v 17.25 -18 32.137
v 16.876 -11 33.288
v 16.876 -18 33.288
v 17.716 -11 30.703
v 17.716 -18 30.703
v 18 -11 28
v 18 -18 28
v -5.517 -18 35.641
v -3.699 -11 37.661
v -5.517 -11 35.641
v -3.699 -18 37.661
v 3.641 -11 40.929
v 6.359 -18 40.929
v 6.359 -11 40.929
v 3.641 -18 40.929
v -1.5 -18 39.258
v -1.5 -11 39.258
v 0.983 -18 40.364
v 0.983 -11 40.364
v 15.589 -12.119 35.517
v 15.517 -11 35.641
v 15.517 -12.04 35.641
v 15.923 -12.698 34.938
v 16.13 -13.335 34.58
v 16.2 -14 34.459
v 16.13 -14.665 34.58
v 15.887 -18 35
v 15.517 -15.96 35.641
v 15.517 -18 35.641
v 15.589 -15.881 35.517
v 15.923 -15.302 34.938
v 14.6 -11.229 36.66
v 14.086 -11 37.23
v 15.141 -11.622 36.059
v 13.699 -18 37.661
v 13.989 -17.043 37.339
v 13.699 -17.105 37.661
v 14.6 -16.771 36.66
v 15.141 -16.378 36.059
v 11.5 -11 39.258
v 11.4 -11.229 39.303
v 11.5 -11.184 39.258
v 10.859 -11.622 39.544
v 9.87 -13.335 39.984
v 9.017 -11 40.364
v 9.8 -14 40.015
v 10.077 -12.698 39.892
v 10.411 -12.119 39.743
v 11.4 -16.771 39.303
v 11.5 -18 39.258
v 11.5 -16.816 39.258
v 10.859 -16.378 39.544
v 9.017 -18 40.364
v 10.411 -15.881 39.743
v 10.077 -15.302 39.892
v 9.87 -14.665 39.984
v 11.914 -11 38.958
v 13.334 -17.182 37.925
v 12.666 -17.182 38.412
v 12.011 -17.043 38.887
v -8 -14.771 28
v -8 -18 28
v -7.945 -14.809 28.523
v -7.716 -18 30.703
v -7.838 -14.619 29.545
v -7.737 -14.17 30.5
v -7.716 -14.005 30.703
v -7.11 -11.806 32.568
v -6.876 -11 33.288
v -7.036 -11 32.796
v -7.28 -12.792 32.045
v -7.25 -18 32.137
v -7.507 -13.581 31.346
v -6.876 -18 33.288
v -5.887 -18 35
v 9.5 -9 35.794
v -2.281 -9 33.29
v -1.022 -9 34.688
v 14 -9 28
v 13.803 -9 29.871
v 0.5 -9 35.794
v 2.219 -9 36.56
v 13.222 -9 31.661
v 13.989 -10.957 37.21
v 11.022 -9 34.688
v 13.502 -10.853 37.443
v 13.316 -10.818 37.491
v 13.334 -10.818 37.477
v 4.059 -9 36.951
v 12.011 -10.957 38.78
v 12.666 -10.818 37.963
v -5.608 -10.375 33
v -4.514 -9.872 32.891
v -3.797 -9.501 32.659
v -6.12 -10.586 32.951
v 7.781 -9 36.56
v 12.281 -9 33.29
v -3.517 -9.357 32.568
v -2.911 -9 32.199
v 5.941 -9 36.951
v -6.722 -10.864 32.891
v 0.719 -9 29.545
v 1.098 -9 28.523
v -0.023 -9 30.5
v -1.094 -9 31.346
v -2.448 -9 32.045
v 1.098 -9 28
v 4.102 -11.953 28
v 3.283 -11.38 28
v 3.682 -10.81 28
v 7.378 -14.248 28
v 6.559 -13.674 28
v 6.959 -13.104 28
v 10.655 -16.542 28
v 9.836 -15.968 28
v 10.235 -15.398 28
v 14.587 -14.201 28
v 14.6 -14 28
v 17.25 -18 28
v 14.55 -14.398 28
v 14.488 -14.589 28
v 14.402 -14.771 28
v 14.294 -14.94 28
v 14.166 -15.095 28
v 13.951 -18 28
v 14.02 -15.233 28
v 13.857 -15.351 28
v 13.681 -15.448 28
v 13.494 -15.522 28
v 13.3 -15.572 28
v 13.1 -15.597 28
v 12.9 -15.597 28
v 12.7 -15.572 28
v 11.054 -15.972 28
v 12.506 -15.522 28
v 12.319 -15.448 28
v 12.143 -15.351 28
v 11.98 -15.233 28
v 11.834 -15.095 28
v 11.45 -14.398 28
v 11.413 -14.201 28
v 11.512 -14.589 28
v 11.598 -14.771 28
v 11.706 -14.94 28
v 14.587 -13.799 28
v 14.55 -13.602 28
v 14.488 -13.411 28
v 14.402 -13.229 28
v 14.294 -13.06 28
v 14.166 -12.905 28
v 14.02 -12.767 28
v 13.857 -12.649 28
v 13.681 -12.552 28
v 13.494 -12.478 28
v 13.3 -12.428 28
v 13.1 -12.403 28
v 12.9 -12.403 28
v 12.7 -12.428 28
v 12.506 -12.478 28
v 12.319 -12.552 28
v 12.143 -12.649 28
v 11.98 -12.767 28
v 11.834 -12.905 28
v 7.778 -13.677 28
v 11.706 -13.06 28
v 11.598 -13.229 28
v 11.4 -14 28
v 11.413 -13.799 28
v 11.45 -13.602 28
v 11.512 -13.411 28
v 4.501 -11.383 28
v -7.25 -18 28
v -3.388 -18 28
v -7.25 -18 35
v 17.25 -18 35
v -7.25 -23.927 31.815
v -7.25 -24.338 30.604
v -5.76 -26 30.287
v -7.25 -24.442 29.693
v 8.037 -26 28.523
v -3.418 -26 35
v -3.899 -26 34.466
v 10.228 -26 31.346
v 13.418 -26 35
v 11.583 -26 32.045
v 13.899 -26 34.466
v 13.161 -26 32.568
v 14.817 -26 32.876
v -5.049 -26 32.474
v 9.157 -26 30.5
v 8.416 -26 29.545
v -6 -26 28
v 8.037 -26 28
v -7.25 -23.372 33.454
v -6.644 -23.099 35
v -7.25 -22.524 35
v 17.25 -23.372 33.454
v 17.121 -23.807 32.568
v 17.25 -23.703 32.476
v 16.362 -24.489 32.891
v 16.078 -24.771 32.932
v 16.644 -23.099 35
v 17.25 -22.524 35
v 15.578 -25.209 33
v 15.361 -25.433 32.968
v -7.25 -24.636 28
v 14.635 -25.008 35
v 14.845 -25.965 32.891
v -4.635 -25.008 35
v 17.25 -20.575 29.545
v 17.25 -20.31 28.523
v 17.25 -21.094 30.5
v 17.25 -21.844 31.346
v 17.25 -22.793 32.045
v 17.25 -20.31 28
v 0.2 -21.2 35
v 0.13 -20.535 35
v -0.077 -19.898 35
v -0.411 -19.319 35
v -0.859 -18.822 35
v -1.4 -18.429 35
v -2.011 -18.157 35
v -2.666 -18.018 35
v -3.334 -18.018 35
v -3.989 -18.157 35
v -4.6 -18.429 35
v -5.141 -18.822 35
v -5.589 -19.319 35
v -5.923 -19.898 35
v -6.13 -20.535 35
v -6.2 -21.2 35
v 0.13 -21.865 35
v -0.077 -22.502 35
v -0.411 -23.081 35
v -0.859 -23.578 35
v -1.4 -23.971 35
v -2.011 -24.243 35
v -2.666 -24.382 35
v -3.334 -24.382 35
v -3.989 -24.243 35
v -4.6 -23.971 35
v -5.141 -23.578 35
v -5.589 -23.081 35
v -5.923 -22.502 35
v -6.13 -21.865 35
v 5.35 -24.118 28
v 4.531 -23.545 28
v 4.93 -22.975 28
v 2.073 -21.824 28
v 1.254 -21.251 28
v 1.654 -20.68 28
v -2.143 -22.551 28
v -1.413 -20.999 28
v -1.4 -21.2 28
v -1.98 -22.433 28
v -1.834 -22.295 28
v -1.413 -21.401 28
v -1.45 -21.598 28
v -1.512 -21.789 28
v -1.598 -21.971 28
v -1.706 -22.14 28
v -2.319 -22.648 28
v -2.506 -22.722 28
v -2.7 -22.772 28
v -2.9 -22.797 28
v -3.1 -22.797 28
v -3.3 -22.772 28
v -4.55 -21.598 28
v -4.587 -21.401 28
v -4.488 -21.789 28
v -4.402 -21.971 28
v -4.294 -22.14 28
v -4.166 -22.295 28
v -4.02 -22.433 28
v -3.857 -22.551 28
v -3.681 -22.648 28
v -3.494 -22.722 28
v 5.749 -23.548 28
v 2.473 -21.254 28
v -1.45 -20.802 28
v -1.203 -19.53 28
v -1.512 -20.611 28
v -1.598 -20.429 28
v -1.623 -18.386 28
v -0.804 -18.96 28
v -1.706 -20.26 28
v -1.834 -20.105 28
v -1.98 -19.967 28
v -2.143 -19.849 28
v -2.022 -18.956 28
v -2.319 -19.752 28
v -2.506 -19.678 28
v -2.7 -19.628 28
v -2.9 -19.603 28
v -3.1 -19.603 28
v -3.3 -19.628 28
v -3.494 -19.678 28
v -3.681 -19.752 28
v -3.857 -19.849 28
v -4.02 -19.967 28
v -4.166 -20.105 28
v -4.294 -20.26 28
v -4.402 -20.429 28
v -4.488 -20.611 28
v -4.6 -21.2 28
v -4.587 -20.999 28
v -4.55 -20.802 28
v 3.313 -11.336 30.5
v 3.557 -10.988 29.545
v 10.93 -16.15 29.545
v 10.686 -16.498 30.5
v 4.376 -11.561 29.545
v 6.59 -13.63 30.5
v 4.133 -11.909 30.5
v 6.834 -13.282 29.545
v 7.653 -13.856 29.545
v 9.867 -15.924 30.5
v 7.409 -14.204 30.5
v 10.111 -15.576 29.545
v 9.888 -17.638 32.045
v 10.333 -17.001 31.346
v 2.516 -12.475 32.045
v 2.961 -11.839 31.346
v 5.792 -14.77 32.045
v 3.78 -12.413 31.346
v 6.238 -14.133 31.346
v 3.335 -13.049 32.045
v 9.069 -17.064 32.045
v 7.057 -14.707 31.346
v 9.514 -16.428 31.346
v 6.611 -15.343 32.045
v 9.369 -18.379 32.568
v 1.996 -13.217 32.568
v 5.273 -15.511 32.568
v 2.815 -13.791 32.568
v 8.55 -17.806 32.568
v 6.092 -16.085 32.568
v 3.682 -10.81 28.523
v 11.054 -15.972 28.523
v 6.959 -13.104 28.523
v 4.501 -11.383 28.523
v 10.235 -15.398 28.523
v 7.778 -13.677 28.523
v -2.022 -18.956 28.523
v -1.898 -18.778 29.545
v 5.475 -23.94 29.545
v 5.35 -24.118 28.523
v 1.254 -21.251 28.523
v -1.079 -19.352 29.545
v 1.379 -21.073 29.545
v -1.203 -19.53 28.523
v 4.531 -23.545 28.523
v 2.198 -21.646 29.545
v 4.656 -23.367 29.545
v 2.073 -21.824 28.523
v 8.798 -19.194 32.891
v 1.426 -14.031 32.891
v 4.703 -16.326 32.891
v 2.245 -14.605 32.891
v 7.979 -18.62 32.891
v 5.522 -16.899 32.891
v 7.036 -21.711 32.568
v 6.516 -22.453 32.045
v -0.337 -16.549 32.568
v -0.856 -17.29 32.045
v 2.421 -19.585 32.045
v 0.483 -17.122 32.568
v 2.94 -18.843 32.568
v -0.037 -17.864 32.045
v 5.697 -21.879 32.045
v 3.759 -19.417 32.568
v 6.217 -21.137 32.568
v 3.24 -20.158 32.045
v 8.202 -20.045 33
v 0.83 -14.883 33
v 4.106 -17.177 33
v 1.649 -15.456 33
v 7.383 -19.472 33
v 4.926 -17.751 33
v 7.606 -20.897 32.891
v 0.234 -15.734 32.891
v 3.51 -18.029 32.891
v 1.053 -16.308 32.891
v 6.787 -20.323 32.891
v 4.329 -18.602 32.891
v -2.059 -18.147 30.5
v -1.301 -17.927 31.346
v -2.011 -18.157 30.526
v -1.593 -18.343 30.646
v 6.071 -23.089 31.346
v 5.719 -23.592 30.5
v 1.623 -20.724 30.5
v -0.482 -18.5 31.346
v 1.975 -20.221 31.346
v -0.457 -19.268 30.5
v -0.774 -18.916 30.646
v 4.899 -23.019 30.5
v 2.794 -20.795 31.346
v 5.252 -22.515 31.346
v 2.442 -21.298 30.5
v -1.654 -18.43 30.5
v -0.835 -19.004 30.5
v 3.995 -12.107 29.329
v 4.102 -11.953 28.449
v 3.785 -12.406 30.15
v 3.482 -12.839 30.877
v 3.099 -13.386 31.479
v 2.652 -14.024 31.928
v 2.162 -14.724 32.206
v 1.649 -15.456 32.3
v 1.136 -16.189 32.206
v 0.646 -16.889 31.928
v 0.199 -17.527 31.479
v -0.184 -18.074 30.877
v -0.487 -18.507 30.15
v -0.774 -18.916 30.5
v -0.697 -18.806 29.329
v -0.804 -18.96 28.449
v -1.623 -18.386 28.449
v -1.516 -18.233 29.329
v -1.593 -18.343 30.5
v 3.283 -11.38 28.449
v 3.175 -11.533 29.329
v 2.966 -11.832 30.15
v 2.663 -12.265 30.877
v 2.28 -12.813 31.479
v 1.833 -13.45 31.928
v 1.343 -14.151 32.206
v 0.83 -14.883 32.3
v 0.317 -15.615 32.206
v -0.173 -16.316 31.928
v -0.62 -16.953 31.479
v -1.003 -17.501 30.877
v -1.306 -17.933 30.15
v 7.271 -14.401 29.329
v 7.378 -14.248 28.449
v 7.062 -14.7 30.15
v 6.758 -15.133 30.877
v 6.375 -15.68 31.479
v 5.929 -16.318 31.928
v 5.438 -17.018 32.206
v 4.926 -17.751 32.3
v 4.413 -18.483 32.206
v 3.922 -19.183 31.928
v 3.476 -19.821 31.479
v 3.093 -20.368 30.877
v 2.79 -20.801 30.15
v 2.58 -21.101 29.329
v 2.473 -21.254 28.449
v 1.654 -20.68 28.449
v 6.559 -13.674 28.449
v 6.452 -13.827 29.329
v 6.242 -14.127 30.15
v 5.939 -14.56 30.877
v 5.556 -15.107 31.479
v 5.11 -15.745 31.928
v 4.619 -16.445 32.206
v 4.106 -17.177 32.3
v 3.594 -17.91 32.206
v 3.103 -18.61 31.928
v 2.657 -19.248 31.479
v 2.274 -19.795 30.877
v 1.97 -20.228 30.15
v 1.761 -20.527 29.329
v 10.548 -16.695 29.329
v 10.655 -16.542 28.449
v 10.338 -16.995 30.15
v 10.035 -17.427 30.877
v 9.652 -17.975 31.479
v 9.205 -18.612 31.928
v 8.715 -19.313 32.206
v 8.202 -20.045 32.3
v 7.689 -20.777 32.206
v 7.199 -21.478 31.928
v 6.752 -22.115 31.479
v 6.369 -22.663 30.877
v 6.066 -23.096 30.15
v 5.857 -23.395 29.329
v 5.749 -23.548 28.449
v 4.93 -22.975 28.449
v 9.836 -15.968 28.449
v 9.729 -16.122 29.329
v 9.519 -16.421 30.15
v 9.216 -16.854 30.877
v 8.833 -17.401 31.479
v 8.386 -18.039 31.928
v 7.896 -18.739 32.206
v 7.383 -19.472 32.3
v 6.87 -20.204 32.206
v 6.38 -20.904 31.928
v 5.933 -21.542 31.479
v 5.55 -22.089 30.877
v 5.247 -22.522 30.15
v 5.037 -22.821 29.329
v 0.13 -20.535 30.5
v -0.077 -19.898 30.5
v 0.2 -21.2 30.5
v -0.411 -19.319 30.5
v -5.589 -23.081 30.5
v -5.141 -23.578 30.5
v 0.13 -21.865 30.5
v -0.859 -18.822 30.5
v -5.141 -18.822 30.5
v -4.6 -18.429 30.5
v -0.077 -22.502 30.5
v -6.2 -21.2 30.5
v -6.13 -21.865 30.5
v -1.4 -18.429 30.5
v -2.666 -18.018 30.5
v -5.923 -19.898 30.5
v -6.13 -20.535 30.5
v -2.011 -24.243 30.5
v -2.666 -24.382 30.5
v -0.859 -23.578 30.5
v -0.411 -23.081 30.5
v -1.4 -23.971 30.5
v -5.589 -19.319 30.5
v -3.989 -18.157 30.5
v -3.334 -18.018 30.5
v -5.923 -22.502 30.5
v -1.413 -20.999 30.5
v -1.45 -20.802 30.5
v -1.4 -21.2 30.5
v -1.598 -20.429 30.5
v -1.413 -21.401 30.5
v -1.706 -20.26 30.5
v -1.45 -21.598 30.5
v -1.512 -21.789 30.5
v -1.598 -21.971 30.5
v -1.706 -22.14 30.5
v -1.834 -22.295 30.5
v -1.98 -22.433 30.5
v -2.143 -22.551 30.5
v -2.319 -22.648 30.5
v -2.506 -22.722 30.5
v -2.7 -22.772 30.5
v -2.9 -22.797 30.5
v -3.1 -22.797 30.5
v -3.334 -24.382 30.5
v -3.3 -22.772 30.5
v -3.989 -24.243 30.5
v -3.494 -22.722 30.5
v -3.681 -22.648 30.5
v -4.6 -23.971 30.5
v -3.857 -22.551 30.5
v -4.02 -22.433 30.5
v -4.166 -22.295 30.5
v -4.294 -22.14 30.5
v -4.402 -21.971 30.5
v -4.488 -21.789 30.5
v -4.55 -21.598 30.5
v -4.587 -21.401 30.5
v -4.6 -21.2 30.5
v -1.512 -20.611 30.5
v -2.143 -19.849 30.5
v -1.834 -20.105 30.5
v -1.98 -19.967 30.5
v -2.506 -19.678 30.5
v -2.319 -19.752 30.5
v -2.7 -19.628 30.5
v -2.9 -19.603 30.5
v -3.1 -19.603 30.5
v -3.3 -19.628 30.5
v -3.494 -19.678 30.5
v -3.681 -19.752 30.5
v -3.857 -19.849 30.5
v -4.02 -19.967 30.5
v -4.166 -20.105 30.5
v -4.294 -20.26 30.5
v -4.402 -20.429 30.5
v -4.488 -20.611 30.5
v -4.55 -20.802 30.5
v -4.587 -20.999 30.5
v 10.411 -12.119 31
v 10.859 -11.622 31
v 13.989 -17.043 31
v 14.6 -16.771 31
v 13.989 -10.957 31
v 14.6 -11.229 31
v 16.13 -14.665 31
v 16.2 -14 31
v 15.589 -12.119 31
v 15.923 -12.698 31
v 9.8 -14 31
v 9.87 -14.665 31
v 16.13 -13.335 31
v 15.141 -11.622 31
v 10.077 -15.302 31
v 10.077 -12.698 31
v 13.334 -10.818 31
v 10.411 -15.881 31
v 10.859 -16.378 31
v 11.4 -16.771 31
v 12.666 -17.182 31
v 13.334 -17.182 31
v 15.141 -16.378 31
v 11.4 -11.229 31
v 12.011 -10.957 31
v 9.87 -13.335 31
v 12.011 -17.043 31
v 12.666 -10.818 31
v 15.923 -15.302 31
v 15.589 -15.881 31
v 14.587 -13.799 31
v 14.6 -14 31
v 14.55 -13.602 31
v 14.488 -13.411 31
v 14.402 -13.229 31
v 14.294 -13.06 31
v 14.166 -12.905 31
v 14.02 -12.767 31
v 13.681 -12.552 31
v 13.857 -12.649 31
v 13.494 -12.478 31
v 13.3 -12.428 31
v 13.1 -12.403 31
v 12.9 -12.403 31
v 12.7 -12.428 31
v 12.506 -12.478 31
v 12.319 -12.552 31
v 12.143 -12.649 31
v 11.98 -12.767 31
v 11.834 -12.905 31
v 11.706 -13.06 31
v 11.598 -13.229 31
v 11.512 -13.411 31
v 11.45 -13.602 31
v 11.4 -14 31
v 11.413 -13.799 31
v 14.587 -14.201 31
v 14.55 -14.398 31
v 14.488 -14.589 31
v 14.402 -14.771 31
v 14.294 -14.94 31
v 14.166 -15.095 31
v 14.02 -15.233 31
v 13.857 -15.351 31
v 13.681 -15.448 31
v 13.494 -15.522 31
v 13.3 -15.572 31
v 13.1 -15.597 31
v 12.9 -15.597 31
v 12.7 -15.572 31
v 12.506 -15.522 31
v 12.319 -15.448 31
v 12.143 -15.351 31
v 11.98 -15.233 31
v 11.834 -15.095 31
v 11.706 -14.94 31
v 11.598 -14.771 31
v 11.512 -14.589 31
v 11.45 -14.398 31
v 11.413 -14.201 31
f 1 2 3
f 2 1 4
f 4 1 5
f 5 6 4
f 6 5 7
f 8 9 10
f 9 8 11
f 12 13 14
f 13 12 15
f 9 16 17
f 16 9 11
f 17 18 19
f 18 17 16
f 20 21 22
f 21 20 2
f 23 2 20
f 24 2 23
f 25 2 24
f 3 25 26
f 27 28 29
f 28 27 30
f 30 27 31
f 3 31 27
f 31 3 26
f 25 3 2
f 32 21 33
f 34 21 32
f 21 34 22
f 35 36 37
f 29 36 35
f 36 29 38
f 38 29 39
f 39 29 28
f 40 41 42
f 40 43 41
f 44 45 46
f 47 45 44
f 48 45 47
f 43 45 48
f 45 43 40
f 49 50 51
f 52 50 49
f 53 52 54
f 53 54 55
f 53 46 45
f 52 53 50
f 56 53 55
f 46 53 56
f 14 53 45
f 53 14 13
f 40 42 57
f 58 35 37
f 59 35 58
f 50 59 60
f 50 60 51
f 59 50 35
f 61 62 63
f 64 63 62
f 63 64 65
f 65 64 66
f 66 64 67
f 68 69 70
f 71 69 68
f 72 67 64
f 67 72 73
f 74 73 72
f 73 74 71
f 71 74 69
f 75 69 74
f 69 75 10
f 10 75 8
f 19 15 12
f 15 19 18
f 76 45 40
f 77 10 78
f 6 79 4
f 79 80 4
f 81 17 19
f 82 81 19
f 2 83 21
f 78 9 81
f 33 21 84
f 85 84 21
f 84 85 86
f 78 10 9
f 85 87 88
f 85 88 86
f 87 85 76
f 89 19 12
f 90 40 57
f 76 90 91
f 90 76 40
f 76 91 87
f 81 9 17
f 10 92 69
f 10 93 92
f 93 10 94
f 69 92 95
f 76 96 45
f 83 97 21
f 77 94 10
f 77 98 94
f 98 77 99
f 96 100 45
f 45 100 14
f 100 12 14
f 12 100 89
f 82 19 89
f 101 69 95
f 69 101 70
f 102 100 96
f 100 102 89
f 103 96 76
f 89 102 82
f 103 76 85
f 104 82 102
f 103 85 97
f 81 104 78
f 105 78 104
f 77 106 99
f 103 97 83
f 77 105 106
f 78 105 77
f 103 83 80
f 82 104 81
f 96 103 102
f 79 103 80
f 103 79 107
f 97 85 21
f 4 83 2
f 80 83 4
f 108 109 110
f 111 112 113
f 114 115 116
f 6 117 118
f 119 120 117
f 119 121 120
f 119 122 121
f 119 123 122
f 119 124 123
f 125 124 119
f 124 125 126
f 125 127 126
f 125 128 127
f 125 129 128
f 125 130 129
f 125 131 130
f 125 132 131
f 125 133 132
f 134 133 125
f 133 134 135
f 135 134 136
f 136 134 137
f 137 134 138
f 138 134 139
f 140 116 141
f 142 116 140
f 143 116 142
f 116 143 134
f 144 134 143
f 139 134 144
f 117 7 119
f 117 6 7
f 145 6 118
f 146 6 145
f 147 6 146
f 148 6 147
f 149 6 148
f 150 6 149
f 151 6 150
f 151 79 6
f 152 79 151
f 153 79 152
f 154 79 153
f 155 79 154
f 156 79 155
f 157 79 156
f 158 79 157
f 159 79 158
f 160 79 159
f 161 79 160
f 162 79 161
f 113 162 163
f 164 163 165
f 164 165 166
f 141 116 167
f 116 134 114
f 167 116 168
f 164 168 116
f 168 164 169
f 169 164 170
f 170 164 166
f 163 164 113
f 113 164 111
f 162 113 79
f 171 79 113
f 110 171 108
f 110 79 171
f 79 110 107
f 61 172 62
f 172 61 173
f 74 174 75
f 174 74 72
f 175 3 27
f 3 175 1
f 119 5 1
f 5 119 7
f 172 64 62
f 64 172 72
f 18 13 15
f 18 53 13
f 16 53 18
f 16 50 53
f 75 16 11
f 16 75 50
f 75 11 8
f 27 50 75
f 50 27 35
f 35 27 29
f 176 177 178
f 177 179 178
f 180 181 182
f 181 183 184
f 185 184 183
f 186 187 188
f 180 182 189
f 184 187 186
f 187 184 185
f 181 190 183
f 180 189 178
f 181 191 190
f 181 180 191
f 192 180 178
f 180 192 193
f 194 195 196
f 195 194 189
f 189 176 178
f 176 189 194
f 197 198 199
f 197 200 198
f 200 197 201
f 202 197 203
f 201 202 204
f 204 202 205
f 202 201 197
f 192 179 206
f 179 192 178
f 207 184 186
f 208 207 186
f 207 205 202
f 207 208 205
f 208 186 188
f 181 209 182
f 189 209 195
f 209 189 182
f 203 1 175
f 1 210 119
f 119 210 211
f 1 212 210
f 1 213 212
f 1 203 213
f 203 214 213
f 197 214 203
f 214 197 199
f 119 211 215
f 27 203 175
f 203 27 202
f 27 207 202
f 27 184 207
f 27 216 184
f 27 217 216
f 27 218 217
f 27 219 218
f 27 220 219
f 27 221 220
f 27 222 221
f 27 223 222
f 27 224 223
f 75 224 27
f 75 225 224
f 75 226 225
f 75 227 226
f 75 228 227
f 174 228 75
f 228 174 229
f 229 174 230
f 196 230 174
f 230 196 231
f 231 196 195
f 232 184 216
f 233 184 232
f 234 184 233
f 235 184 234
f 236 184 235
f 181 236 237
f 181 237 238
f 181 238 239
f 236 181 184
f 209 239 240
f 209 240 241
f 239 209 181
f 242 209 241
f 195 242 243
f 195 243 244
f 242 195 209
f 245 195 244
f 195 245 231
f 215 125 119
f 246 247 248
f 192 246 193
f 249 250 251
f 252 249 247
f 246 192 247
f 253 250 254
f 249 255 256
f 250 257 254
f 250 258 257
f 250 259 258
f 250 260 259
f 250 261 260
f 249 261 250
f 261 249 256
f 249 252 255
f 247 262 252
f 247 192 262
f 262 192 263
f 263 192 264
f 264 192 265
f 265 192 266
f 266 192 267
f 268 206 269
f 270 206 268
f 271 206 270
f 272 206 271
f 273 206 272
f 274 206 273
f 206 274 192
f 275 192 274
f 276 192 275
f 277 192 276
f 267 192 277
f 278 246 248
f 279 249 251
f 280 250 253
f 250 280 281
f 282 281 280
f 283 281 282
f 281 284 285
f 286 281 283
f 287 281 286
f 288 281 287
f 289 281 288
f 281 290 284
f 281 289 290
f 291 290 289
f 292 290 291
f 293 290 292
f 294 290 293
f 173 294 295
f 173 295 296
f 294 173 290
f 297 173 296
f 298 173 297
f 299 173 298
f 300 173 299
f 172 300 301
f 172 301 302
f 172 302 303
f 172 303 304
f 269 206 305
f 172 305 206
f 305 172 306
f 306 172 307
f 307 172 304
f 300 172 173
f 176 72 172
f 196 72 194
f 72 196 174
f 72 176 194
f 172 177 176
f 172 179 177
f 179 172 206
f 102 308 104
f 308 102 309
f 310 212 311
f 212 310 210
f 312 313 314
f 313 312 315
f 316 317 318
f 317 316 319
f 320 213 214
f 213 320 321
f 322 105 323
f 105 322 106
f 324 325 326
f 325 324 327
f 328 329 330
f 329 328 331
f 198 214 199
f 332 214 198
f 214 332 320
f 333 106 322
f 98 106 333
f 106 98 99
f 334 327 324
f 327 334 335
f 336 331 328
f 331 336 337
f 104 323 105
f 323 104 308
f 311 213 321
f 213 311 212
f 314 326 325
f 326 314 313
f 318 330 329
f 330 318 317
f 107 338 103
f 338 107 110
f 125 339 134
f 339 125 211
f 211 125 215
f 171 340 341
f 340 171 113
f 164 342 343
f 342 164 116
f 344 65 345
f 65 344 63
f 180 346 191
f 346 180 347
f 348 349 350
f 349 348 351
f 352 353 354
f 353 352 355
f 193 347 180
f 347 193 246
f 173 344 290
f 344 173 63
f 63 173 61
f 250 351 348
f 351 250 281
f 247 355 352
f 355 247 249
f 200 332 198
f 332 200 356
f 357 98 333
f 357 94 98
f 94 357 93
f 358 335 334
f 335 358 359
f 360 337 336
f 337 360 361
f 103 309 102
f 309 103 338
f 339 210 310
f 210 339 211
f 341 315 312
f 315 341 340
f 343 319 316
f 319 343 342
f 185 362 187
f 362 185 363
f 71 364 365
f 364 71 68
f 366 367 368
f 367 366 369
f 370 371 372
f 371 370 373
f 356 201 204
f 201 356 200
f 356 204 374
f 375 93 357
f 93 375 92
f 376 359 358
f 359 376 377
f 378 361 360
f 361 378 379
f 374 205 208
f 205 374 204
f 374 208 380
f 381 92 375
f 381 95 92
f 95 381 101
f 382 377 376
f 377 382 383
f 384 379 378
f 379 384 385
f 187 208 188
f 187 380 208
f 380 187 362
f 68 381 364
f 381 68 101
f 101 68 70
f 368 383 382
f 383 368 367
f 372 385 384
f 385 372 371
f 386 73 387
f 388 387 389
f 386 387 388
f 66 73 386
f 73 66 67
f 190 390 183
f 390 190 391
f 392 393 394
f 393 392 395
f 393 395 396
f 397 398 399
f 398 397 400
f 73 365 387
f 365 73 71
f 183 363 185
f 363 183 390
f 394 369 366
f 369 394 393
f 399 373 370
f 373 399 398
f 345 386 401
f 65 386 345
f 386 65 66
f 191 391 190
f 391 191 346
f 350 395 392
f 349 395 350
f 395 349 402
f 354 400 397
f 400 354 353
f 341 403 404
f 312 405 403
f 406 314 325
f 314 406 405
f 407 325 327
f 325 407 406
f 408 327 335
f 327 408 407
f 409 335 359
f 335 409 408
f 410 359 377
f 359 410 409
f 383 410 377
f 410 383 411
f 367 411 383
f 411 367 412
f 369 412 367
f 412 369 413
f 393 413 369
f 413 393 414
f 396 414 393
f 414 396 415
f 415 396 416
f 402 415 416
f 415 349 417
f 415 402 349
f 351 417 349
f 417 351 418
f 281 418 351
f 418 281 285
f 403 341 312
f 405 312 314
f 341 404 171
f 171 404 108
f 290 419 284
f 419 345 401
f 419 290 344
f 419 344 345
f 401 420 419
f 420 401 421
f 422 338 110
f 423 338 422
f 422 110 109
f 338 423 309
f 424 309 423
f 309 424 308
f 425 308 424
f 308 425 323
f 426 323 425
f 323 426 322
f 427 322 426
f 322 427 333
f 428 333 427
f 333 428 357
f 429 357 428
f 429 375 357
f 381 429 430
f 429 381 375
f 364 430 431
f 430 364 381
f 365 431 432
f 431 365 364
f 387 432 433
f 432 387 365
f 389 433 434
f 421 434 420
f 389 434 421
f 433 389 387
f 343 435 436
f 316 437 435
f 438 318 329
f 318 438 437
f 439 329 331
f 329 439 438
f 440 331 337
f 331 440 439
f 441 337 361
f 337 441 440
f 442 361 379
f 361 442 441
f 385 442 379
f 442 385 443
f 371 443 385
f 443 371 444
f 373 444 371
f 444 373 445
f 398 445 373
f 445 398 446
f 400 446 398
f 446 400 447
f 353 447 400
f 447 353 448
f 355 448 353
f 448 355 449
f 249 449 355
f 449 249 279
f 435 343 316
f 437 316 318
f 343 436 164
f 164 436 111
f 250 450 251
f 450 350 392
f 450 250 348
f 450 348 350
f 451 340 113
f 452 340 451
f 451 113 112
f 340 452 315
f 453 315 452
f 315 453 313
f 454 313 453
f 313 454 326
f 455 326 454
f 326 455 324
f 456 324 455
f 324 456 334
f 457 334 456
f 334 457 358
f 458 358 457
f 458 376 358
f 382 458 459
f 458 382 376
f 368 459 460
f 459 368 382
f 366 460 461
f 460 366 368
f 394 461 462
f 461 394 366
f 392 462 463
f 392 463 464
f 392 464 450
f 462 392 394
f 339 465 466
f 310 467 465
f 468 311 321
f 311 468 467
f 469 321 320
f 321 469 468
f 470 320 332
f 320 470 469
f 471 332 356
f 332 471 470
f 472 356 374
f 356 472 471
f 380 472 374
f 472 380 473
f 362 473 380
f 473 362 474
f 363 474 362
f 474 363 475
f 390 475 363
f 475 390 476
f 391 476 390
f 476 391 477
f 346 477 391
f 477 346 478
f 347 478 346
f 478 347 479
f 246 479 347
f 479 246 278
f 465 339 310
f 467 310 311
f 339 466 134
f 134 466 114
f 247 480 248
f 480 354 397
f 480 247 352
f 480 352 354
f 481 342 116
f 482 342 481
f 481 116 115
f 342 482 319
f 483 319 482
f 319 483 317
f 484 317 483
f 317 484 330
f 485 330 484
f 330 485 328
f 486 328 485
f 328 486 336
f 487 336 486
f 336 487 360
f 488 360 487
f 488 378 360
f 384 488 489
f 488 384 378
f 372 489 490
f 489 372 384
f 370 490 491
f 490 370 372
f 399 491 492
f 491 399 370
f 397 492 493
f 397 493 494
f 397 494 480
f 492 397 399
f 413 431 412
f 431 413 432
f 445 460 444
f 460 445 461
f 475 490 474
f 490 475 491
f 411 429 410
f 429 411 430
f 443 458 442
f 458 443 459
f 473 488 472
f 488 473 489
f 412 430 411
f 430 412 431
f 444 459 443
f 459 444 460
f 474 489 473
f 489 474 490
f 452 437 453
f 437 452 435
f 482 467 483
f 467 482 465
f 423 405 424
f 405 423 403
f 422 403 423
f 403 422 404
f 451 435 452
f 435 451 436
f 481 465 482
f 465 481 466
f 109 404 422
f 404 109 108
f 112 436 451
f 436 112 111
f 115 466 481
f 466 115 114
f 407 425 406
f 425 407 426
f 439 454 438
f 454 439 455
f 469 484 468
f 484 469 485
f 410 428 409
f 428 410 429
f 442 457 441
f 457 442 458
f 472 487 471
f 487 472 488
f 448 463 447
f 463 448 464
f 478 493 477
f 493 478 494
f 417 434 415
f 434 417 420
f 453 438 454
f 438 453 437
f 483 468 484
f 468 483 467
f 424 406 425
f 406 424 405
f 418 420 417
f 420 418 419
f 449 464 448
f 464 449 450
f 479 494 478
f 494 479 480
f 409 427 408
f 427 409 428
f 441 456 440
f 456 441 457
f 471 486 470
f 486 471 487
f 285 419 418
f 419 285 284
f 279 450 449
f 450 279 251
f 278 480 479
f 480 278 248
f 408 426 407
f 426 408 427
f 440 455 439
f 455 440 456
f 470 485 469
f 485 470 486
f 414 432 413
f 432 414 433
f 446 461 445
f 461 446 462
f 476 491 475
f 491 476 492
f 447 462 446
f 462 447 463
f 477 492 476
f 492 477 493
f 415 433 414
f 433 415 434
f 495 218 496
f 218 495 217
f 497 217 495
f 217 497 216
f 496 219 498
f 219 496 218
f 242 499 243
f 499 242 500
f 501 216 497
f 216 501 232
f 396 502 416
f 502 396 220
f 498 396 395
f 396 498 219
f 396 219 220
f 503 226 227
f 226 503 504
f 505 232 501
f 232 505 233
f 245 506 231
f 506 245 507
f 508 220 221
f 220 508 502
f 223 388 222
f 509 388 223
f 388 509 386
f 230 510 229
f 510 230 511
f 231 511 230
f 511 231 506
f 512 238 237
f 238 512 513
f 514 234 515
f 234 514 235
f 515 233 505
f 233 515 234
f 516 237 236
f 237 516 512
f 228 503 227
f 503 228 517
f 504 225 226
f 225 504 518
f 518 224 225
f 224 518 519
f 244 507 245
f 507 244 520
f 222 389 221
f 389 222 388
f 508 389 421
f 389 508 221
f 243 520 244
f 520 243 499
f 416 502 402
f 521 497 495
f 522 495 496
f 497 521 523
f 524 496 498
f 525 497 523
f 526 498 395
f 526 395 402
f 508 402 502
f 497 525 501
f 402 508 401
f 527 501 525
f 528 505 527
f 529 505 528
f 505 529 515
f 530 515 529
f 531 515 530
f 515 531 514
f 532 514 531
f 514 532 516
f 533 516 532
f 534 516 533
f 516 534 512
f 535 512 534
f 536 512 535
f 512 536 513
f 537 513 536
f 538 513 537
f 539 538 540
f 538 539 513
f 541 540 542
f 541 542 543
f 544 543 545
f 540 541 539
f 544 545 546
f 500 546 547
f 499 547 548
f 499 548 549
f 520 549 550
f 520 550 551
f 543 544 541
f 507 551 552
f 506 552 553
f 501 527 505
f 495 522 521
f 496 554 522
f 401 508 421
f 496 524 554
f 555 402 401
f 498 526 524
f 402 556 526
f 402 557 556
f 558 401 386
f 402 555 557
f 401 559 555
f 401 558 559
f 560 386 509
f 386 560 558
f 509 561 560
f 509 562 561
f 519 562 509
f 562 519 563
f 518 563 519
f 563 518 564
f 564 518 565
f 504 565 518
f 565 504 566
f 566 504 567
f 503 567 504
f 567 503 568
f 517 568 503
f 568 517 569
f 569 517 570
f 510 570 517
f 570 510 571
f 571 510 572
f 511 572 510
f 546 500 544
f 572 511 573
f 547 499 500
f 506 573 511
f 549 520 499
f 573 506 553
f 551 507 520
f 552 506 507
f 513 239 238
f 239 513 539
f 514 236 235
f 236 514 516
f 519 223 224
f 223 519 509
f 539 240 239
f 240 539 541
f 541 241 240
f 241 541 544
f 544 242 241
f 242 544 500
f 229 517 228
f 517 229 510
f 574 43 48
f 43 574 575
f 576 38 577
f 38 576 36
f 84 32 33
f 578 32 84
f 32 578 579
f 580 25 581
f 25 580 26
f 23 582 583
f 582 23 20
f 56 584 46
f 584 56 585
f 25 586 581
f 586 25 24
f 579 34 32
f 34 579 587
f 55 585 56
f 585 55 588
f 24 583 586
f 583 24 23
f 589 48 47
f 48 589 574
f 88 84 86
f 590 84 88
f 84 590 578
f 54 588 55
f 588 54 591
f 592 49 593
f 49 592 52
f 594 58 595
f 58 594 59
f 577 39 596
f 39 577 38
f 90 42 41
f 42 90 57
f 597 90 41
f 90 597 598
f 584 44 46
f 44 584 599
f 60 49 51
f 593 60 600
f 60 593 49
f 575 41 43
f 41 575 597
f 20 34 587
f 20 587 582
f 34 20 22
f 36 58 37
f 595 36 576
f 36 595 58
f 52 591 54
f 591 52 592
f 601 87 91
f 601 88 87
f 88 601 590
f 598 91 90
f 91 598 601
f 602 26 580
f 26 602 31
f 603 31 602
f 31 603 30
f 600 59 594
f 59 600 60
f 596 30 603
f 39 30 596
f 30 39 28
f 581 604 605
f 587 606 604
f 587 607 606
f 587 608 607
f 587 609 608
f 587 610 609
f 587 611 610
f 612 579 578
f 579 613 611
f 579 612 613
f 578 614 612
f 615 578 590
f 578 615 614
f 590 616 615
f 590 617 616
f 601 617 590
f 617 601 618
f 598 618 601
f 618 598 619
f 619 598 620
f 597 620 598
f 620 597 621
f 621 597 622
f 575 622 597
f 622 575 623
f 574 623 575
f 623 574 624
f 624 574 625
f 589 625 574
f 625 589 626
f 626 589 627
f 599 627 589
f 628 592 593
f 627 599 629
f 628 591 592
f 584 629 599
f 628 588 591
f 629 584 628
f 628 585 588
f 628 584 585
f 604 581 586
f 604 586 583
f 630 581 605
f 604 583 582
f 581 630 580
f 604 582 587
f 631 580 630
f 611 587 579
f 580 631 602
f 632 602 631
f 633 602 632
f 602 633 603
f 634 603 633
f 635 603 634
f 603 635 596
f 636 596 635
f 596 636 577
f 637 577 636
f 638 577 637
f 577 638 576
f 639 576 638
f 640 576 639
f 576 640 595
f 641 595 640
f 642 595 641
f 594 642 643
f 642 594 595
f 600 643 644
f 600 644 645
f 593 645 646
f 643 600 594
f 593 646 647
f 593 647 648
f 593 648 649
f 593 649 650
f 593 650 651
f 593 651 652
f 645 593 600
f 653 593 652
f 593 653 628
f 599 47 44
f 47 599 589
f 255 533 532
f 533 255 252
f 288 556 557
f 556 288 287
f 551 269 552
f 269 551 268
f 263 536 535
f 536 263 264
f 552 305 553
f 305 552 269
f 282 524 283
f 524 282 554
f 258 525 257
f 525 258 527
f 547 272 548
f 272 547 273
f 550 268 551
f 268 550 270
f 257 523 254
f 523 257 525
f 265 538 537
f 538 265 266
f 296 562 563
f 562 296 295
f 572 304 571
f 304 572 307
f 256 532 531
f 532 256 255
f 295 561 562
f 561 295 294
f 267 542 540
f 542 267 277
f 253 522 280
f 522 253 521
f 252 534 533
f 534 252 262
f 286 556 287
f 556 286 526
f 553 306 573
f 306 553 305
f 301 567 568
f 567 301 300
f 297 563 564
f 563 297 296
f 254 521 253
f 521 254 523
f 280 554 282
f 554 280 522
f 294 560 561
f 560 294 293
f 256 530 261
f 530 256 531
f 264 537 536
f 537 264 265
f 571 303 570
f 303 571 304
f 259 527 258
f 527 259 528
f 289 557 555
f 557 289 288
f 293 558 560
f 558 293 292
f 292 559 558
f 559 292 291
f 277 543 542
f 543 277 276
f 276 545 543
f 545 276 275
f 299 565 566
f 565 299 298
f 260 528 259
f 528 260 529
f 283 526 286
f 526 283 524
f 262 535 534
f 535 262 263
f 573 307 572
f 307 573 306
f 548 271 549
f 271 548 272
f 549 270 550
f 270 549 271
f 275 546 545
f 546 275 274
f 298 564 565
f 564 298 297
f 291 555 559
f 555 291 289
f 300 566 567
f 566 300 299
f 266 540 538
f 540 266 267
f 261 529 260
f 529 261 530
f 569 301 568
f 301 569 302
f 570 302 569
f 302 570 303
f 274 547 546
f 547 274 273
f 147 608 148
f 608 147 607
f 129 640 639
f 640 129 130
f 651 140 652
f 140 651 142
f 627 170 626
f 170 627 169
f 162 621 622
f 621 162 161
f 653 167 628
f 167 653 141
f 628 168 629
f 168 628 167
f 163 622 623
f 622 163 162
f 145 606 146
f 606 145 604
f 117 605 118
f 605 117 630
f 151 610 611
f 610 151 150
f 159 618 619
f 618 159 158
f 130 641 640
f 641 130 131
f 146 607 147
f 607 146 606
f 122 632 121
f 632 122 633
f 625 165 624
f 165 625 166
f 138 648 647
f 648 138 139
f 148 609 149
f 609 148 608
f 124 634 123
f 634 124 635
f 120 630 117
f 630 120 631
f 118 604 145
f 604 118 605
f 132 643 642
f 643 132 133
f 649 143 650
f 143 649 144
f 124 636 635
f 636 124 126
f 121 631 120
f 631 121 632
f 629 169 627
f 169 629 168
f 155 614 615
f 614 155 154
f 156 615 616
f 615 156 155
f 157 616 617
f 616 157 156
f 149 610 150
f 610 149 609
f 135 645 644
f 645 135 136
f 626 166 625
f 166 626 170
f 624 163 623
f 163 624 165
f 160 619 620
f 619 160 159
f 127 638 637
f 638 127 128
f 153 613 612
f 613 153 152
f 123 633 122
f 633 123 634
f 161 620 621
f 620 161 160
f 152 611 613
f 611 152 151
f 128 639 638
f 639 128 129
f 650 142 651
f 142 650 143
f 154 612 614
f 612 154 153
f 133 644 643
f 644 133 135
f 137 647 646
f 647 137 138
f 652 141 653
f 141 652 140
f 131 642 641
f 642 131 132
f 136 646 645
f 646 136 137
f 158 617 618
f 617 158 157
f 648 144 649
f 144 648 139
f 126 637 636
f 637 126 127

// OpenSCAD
// PRUSA iteration4
// Heatbed cable clip
// GNU GPL v3
// Josef Průša <iam@josefprusa.cz> and contributors
// http://www.reprap.org/wiki/Prusa_Mendel
// http://prusamendel.org


 module heatbed_cable_clip()
{
    
difference()
{    
    
    union()
    {
        difference()
        {
            union()
            {
                // body base
                translate([75,99,28]) rotate([90,0,0]) cylinder( h = 15, r = 13, $fn=30); 
                translate([75,101,28]) rotate([90,0,0]) cylinder( h = 2, r1=9,r2 = 13, $fn=30); 
                
            }

             
           
            
            // cut flat and shape
            translate([60,82,14]) cube([30,20,14]);  
            translate([60,72,20]) cube([30,20,30]); 
        }
         
        
        difference() {
        translate([62.75,84,28]) cube([24.5,8,7]);
        difference () {
        translate([75,85,28]) rotate([90,0,0]) cube([30,20,10], center = true);    
        translate([75,90,28]) rotate([90,0,0]) cylinder(h=6,r1=16.5,r2=11,$fn=30);   
           
        } 
    }}
    
    // cable opening
    translate([61,102,28]) rotate([35,90,0])
    
    difference (){
   
    cylinder(h=35,r=5,$fn=30);
       
    
    //translate([0,0,3]) cylinder(h=5,r=5,$fn=30);
    translate([0,0,12]) cylinder(h=1,r=5,$fn=30); 
    translate([0,0,16]) cylinder(h=1,r=5,$fn=30); 
    translate([0,0,20]) cylinder(h=1,r=5,$fn=30);
   
    }
     translate([61,102,28]) rotate([35,90,0]) cylinder(h=35,r=4.3,$fn=30);
    
  
    
    // screw heads
    translate([67,88.8,30.5]) rotate([0,0,0]) cylinder(h=10,r=3.2,$fn=30); 
    translate([83,96,31]) rotate([0,0,0]) cylinder(h=10,r=3.2,$fn=30); 
    
    
    // screws
            translate([67,88.8,14]) rotate([0,0,0]) cylinder(h=35,r=1.6,$fn=50); 
            translate([83,96,14]) rotate([0,0,0]) cylinder(h=35,r=1.6,$fn=50);
    

    
    
    
}


    

} 

translate([-70,-110,0]) heatbed_cable_clip();
